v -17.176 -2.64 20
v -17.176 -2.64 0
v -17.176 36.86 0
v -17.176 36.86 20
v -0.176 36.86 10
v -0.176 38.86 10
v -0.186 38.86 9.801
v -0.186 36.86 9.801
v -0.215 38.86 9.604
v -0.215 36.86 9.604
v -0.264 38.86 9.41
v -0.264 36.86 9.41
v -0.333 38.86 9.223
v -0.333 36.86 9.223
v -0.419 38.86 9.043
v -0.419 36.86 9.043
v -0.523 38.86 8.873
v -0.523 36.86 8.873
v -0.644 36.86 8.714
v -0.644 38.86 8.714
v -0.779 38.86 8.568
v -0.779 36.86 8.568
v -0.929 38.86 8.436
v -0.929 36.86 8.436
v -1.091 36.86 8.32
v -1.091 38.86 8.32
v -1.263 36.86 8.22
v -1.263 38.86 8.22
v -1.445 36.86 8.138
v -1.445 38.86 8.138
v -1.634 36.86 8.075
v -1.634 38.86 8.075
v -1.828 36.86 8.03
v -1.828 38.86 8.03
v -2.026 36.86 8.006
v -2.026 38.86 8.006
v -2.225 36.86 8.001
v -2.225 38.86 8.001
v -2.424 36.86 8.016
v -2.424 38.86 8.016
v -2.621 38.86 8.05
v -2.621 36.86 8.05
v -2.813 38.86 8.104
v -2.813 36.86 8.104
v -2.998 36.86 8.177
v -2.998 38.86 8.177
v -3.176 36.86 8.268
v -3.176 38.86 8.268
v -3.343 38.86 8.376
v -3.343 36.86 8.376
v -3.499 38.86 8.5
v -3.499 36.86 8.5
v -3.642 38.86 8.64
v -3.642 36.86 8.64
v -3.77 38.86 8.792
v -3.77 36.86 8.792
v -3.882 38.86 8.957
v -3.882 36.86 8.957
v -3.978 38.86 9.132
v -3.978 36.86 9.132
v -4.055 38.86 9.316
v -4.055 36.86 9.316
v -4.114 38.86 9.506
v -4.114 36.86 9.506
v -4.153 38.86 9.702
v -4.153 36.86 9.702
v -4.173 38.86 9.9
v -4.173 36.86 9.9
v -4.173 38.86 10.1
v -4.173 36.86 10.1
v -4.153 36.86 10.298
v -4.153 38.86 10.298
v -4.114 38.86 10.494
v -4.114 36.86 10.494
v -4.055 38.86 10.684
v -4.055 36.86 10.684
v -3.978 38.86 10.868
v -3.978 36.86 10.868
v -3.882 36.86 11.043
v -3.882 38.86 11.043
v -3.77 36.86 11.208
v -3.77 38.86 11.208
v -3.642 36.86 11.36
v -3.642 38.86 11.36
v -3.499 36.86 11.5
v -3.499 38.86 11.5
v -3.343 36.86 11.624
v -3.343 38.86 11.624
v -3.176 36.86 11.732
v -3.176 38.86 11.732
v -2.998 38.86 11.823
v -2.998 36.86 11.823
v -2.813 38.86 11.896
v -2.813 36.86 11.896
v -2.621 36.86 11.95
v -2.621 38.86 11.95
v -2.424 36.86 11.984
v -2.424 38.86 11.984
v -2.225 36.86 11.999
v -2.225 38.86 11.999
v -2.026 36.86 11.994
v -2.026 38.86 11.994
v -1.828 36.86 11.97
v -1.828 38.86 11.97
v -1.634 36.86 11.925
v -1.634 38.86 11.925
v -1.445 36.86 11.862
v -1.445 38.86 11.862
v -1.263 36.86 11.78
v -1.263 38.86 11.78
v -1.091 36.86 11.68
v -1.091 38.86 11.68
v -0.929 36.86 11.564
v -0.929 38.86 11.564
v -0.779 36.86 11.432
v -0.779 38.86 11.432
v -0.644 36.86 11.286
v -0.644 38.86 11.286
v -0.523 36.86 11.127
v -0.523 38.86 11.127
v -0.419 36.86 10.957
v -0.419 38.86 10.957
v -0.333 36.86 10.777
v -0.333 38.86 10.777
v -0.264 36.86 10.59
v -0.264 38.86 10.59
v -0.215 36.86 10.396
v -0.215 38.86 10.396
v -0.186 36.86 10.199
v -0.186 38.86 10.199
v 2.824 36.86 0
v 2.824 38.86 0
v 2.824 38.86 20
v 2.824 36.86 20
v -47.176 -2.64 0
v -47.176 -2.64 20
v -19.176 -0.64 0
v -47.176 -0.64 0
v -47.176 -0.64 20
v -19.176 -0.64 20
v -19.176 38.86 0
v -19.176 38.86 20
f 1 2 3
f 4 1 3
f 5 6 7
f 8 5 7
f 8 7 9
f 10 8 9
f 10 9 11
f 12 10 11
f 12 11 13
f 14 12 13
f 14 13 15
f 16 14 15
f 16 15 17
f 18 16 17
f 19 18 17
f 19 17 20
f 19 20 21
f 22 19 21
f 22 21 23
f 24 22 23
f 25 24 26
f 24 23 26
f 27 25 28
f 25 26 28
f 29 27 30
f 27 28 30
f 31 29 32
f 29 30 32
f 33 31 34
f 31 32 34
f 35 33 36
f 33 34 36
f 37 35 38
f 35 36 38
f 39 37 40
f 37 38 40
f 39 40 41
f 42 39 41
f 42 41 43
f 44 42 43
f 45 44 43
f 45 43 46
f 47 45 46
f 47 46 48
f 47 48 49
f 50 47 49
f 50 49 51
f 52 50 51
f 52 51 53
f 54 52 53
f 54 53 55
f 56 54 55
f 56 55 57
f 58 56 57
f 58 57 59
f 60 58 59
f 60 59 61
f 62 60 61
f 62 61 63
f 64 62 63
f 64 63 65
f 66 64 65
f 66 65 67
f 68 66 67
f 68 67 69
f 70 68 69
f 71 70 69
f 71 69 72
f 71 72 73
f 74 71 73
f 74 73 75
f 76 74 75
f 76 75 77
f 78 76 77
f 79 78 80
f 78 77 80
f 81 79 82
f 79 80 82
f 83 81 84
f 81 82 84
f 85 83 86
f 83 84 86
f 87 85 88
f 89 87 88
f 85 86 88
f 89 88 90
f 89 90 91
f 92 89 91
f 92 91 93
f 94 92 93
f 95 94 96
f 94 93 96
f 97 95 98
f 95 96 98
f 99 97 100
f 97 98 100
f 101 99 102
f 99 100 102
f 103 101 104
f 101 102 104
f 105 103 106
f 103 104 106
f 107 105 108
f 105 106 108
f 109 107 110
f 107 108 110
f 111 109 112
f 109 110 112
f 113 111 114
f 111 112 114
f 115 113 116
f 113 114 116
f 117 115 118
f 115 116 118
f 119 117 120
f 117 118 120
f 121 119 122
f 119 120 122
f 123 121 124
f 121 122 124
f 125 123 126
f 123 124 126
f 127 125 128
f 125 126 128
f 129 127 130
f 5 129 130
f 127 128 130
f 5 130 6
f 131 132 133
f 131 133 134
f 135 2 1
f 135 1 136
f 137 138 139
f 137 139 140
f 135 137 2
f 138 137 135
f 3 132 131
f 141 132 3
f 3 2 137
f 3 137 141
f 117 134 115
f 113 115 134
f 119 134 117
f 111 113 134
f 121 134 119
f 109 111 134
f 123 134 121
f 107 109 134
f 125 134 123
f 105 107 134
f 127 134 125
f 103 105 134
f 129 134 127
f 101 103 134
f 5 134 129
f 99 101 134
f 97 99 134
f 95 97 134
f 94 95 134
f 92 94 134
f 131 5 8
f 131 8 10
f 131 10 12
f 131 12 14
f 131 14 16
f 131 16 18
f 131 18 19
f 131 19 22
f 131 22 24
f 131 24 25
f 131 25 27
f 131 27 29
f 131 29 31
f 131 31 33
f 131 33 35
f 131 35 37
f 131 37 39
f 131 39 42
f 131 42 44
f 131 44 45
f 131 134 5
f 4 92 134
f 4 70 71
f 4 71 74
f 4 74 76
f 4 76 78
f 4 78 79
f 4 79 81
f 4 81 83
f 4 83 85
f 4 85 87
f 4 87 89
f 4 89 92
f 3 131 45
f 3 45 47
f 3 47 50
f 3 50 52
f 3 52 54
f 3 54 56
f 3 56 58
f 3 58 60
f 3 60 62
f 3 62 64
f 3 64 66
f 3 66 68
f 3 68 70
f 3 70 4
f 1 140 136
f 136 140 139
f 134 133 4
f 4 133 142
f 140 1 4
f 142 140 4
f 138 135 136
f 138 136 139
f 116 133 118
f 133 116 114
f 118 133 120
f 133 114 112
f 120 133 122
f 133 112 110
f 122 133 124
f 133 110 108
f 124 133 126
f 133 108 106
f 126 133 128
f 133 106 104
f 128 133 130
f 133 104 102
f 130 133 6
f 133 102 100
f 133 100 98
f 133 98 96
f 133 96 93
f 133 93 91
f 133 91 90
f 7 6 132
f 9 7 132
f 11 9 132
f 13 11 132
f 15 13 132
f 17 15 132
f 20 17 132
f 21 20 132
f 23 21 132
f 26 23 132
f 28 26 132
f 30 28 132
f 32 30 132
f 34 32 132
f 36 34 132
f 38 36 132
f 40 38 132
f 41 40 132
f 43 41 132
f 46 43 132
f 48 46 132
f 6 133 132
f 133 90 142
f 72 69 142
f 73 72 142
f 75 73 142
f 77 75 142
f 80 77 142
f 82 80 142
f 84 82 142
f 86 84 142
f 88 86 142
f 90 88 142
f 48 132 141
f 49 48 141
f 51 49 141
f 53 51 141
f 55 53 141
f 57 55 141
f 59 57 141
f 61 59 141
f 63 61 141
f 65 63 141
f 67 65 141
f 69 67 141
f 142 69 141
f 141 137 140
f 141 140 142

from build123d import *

# Parameters (mm, degrees)
EXTRUDE_1_DEPTH     = 20
SKETCH_2_R          = 2
CUT_EXTRUDE_1_DEPTH = 20


with BuildPart() as part:
    # 草图1 → 凸台-拉伸1 (new body)
    with BuildSketch(Plane.XY):
        Polygon((-17.175607408, 38.860314389), (-7.175607408, 38.860314389), (2.824392592, 38.860314389), (2.824392592, 36.860314389), (-17.175607408, 36.860314389), (-17.175607408, -0.639685611), (-17.175607408, -2.639685611), (-47.175607408, -2.639685611), (-47.175607408, -0.639685611), (-19.175607408, -0.639685611), (-19.175607408, 38.860314389), align=None)
    extrude(amount=EXTRUDE_1_DEPTH)

    # 草图2 → 切除-拉伸1 (cut)
    with BuildSketch(Plane(origin=(0, 38.860314389, 0), x_dir=(1, 0, 0), z_dir=(0, 1, 0))):
        with Locations((-2.175607408, -10)):
            Circle(SKETCH_2_R)
    extrude(amount=-CUT_EXTRUDE_1_DEPTH, mode=Mode.SUBTRACT)


solid = part.part
